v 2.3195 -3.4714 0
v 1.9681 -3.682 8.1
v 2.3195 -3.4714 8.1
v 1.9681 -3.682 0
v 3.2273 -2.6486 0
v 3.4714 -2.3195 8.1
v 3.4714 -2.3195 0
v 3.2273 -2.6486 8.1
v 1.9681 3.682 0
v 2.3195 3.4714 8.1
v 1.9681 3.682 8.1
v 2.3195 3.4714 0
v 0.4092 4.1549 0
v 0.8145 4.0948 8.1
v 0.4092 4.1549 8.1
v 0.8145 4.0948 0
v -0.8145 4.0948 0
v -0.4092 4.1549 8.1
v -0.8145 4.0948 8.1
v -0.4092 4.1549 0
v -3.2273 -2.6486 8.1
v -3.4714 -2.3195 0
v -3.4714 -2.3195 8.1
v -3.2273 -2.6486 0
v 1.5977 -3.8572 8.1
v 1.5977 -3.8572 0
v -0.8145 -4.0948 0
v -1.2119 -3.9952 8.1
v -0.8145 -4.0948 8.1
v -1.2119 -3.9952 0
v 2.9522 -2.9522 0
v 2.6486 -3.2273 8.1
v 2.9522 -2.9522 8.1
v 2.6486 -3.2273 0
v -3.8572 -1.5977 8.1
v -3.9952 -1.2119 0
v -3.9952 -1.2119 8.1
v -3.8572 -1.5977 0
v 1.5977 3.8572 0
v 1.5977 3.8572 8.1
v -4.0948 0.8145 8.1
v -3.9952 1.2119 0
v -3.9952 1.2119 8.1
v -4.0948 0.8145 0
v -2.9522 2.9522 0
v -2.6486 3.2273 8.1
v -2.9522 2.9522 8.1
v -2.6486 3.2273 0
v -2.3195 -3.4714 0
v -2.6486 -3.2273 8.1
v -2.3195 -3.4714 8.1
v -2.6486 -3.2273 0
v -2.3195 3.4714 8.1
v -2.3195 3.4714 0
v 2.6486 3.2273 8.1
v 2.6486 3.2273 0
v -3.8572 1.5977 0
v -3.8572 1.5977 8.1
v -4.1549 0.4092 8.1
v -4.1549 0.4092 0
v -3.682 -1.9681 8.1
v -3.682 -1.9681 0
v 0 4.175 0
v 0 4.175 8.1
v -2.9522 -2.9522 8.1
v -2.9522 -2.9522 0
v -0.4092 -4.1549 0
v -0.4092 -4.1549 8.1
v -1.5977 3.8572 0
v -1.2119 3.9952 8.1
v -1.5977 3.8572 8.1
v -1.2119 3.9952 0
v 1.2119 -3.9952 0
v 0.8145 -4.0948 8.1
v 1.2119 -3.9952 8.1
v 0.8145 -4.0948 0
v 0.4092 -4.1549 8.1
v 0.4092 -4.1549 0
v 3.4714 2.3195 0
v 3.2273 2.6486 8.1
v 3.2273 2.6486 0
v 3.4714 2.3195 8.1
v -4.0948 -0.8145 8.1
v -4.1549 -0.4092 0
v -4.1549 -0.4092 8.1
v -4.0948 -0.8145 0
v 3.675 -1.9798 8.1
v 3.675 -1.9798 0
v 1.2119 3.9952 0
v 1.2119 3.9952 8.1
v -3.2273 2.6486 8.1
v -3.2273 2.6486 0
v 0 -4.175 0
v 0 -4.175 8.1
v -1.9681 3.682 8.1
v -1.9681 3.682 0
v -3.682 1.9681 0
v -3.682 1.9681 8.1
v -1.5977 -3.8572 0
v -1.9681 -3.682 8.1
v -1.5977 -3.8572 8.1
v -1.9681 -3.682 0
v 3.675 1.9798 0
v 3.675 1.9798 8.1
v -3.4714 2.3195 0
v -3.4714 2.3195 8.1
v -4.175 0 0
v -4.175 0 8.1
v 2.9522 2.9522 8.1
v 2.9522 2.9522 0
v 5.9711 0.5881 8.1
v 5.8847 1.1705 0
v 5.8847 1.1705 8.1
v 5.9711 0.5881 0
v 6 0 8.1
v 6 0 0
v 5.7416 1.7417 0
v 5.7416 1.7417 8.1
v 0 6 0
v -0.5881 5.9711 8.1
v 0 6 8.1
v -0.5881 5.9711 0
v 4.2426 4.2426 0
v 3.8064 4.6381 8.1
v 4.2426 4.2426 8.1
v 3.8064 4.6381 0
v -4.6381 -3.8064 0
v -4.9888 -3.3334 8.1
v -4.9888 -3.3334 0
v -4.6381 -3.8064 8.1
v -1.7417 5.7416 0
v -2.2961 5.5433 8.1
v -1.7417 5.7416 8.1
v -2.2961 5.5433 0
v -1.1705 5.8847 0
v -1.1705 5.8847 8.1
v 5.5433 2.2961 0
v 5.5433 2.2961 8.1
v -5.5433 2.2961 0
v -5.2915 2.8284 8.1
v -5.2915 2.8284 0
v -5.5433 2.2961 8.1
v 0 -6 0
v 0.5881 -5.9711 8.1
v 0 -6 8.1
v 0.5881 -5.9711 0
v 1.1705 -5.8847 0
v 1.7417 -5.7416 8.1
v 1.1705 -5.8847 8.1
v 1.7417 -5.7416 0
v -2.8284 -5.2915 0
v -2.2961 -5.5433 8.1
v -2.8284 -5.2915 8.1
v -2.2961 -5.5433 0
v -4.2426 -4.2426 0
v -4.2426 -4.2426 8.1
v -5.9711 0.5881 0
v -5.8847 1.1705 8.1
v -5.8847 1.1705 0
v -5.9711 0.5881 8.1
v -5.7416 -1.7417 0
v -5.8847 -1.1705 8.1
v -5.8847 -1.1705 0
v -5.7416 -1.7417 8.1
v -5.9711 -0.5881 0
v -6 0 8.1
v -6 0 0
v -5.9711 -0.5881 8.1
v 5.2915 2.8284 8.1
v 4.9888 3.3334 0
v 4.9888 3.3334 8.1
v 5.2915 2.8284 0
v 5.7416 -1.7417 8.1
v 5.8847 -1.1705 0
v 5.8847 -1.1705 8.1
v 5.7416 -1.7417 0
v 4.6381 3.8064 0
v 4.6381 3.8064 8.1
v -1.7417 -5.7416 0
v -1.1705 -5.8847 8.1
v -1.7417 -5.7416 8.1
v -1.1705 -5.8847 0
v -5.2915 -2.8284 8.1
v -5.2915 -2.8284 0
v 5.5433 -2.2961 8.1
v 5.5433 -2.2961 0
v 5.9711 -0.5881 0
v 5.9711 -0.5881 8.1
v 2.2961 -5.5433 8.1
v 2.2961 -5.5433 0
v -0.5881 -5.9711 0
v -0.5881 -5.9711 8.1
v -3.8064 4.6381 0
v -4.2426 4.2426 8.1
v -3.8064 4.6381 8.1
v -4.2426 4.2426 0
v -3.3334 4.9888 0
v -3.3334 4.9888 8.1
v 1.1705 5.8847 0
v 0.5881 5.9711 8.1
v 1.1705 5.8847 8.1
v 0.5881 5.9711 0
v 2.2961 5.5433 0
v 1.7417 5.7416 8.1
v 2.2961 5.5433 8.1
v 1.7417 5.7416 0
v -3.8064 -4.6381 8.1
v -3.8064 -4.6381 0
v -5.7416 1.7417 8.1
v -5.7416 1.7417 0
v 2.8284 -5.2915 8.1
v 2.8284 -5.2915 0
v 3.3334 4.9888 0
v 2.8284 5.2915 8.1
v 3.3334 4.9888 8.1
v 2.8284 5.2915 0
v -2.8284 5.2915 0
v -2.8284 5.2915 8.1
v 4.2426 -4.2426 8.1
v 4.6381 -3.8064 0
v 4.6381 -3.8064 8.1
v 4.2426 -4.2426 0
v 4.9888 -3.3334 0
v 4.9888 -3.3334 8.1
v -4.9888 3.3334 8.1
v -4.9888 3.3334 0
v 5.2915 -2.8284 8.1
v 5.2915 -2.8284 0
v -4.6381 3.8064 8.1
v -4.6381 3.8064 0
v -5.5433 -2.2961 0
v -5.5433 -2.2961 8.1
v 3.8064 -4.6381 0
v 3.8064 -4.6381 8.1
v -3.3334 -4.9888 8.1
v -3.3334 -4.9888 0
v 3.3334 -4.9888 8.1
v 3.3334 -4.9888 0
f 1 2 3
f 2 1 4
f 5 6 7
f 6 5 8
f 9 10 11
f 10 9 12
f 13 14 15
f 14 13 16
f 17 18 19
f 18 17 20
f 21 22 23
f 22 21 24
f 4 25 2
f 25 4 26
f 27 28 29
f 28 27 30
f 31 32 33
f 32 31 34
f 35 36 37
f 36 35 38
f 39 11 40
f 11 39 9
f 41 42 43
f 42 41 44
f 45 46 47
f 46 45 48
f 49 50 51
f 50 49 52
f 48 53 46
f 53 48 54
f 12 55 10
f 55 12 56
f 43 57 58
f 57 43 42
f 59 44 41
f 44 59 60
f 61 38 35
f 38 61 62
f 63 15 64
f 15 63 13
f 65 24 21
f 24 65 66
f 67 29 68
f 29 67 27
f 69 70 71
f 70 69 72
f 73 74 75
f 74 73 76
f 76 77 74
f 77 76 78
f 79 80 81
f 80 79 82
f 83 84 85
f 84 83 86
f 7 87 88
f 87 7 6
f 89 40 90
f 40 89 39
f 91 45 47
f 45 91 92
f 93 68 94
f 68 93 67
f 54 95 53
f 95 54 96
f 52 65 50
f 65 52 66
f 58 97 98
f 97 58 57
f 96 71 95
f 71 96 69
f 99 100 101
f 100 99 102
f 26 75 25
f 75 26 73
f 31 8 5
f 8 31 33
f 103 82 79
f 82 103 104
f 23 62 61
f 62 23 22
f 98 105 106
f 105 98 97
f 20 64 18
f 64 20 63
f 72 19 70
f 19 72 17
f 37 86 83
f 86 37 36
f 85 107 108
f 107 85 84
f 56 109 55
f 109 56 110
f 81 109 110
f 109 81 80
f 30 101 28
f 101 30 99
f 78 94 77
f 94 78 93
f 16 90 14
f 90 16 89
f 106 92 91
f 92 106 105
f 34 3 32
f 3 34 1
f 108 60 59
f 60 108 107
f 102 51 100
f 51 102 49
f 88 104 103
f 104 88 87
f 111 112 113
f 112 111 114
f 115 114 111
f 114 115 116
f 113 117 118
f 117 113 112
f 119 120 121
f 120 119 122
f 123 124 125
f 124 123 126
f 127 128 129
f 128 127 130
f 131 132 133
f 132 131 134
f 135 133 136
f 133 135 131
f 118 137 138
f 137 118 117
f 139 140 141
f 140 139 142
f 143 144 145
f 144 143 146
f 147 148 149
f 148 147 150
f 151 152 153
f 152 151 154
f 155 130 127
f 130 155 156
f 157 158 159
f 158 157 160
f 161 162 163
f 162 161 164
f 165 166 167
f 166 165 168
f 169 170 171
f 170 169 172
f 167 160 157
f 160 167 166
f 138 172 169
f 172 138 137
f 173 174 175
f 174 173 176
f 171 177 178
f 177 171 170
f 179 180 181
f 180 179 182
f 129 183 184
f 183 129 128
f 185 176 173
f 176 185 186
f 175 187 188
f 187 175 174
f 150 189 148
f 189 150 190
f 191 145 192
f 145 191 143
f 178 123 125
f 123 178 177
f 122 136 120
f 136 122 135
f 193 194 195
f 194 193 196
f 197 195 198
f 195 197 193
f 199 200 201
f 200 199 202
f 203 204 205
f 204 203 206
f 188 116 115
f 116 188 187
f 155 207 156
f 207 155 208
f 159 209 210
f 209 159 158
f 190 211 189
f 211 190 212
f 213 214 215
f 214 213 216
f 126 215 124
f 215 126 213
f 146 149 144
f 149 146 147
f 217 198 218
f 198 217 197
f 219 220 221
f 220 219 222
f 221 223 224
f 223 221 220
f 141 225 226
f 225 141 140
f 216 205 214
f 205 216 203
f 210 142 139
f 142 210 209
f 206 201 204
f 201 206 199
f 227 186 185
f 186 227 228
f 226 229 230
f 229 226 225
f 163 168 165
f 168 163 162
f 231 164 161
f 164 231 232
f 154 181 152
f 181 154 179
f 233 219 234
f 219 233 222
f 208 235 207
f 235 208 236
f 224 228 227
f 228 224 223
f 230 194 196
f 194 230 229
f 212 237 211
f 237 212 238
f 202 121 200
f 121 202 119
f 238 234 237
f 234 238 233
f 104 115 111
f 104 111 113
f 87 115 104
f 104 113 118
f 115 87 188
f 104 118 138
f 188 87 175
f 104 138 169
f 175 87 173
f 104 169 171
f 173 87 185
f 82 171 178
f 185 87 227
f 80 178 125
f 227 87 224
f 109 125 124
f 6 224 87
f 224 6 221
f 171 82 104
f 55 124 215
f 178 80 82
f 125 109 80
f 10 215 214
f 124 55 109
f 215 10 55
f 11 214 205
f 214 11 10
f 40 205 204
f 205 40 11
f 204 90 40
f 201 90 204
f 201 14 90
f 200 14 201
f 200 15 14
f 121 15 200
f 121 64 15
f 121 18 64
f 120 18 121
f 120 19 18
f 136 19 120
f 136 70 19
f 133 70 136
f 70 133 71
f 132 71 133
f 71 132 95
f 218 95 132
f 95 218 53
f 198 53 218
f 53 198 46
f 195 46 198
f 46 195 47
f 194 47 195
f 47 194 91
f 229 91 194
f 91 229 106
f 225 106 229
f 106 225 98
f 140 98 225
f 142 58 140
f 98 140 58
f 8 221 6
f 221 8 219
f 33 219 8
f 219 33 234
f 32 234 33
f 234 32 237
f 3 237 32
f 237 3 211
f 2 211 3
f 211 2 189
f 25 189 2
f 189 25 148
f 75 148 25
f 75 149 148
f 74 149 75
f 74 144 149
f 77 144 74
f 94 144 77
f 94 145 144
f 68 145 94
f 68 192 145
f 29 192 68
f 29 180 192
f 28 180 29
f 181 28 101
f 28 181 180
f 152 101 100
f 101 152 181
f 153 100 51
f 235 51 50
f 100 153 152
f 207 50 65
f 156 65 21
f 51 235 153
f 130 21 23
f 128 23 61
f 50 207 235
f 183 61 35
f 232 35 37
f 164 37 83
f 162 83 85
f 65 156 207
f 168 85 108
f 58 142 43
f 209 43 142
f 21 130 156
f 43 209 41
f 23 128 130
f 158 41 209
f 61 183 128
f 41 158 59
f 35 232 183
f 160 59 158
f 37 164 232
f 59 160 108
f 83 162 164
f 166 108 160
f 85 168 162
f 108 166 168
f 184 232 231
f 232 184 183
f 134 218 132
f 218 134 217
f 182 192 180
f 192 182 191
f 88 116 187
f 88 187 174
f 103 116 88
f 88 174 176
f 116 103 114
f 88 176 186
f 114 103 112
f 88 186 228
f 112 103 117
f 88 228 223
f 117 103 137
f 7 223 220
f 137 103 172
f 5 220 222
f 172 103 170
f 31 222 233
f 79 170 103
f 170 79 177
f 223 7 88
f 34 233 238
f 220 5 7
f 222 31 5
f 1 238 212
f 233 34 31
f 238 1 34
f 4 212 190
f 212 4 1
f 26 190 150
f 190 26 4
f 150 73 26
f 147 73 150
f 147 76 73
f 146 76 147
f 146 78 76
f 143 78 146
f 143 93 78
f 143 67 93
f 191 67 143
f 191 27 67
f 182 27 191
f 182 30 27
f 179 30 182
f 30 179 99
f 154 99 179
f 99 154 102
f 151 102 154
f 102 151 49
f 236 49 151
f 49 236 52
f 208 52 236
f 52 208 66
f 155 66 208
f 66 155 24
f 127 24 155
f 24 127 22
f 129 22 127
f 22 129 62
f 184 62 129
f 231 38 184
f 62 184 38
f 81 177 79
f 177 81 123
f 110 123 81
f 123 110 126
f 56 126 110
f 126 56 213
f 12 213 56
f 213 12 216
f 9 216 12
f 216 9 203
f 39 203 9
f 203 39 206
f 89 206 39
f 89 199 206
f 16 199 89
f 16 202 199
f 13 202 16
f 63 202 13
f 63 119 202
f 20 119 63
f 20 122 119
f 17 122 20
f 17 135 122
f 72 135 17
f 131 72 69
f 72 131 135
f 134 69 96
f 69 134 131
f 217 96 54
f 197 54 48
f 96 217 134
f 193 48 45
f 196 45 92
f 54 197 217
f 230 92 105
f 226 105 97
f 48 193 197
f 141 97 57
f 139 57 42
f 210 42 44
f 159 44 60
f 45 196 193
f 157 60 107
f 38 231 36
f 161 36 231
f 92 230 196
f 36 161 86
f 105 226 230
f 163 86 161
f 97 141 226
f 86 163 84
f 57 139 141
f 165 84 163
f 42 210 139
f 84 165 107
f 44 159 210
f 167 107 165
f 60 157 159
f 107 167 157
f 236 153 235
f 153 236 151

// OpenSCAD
// Gen-DA — gap sleeve: rigid spacer on the shaft BETWEEN the two rotor carriers (passes through the stator
// hole). Length = m2m, so it sets the magnet gap and carries the full magnet pull. Print x1, upright.
include <parameters.scad>;
$fn = 64;
// D-flat keyed bore: flat faces +X (angle 0 = magnet pocket 0 = index notch)
module dflat_bore(h) {
    intersection() {
        cylinder(d=shaft_bore, h=h);
        translate([-shaft_bore, -shaft_bore, 0]) cube([shaft_bore + dflat_x, 2*shaft_bore, h]);
    }
}

difference() {
    cylinder(d=sleeve_od, h=m2m);
    translate([0, 0, -0.1]) dflat_bore(m2m + 0.2);
}
